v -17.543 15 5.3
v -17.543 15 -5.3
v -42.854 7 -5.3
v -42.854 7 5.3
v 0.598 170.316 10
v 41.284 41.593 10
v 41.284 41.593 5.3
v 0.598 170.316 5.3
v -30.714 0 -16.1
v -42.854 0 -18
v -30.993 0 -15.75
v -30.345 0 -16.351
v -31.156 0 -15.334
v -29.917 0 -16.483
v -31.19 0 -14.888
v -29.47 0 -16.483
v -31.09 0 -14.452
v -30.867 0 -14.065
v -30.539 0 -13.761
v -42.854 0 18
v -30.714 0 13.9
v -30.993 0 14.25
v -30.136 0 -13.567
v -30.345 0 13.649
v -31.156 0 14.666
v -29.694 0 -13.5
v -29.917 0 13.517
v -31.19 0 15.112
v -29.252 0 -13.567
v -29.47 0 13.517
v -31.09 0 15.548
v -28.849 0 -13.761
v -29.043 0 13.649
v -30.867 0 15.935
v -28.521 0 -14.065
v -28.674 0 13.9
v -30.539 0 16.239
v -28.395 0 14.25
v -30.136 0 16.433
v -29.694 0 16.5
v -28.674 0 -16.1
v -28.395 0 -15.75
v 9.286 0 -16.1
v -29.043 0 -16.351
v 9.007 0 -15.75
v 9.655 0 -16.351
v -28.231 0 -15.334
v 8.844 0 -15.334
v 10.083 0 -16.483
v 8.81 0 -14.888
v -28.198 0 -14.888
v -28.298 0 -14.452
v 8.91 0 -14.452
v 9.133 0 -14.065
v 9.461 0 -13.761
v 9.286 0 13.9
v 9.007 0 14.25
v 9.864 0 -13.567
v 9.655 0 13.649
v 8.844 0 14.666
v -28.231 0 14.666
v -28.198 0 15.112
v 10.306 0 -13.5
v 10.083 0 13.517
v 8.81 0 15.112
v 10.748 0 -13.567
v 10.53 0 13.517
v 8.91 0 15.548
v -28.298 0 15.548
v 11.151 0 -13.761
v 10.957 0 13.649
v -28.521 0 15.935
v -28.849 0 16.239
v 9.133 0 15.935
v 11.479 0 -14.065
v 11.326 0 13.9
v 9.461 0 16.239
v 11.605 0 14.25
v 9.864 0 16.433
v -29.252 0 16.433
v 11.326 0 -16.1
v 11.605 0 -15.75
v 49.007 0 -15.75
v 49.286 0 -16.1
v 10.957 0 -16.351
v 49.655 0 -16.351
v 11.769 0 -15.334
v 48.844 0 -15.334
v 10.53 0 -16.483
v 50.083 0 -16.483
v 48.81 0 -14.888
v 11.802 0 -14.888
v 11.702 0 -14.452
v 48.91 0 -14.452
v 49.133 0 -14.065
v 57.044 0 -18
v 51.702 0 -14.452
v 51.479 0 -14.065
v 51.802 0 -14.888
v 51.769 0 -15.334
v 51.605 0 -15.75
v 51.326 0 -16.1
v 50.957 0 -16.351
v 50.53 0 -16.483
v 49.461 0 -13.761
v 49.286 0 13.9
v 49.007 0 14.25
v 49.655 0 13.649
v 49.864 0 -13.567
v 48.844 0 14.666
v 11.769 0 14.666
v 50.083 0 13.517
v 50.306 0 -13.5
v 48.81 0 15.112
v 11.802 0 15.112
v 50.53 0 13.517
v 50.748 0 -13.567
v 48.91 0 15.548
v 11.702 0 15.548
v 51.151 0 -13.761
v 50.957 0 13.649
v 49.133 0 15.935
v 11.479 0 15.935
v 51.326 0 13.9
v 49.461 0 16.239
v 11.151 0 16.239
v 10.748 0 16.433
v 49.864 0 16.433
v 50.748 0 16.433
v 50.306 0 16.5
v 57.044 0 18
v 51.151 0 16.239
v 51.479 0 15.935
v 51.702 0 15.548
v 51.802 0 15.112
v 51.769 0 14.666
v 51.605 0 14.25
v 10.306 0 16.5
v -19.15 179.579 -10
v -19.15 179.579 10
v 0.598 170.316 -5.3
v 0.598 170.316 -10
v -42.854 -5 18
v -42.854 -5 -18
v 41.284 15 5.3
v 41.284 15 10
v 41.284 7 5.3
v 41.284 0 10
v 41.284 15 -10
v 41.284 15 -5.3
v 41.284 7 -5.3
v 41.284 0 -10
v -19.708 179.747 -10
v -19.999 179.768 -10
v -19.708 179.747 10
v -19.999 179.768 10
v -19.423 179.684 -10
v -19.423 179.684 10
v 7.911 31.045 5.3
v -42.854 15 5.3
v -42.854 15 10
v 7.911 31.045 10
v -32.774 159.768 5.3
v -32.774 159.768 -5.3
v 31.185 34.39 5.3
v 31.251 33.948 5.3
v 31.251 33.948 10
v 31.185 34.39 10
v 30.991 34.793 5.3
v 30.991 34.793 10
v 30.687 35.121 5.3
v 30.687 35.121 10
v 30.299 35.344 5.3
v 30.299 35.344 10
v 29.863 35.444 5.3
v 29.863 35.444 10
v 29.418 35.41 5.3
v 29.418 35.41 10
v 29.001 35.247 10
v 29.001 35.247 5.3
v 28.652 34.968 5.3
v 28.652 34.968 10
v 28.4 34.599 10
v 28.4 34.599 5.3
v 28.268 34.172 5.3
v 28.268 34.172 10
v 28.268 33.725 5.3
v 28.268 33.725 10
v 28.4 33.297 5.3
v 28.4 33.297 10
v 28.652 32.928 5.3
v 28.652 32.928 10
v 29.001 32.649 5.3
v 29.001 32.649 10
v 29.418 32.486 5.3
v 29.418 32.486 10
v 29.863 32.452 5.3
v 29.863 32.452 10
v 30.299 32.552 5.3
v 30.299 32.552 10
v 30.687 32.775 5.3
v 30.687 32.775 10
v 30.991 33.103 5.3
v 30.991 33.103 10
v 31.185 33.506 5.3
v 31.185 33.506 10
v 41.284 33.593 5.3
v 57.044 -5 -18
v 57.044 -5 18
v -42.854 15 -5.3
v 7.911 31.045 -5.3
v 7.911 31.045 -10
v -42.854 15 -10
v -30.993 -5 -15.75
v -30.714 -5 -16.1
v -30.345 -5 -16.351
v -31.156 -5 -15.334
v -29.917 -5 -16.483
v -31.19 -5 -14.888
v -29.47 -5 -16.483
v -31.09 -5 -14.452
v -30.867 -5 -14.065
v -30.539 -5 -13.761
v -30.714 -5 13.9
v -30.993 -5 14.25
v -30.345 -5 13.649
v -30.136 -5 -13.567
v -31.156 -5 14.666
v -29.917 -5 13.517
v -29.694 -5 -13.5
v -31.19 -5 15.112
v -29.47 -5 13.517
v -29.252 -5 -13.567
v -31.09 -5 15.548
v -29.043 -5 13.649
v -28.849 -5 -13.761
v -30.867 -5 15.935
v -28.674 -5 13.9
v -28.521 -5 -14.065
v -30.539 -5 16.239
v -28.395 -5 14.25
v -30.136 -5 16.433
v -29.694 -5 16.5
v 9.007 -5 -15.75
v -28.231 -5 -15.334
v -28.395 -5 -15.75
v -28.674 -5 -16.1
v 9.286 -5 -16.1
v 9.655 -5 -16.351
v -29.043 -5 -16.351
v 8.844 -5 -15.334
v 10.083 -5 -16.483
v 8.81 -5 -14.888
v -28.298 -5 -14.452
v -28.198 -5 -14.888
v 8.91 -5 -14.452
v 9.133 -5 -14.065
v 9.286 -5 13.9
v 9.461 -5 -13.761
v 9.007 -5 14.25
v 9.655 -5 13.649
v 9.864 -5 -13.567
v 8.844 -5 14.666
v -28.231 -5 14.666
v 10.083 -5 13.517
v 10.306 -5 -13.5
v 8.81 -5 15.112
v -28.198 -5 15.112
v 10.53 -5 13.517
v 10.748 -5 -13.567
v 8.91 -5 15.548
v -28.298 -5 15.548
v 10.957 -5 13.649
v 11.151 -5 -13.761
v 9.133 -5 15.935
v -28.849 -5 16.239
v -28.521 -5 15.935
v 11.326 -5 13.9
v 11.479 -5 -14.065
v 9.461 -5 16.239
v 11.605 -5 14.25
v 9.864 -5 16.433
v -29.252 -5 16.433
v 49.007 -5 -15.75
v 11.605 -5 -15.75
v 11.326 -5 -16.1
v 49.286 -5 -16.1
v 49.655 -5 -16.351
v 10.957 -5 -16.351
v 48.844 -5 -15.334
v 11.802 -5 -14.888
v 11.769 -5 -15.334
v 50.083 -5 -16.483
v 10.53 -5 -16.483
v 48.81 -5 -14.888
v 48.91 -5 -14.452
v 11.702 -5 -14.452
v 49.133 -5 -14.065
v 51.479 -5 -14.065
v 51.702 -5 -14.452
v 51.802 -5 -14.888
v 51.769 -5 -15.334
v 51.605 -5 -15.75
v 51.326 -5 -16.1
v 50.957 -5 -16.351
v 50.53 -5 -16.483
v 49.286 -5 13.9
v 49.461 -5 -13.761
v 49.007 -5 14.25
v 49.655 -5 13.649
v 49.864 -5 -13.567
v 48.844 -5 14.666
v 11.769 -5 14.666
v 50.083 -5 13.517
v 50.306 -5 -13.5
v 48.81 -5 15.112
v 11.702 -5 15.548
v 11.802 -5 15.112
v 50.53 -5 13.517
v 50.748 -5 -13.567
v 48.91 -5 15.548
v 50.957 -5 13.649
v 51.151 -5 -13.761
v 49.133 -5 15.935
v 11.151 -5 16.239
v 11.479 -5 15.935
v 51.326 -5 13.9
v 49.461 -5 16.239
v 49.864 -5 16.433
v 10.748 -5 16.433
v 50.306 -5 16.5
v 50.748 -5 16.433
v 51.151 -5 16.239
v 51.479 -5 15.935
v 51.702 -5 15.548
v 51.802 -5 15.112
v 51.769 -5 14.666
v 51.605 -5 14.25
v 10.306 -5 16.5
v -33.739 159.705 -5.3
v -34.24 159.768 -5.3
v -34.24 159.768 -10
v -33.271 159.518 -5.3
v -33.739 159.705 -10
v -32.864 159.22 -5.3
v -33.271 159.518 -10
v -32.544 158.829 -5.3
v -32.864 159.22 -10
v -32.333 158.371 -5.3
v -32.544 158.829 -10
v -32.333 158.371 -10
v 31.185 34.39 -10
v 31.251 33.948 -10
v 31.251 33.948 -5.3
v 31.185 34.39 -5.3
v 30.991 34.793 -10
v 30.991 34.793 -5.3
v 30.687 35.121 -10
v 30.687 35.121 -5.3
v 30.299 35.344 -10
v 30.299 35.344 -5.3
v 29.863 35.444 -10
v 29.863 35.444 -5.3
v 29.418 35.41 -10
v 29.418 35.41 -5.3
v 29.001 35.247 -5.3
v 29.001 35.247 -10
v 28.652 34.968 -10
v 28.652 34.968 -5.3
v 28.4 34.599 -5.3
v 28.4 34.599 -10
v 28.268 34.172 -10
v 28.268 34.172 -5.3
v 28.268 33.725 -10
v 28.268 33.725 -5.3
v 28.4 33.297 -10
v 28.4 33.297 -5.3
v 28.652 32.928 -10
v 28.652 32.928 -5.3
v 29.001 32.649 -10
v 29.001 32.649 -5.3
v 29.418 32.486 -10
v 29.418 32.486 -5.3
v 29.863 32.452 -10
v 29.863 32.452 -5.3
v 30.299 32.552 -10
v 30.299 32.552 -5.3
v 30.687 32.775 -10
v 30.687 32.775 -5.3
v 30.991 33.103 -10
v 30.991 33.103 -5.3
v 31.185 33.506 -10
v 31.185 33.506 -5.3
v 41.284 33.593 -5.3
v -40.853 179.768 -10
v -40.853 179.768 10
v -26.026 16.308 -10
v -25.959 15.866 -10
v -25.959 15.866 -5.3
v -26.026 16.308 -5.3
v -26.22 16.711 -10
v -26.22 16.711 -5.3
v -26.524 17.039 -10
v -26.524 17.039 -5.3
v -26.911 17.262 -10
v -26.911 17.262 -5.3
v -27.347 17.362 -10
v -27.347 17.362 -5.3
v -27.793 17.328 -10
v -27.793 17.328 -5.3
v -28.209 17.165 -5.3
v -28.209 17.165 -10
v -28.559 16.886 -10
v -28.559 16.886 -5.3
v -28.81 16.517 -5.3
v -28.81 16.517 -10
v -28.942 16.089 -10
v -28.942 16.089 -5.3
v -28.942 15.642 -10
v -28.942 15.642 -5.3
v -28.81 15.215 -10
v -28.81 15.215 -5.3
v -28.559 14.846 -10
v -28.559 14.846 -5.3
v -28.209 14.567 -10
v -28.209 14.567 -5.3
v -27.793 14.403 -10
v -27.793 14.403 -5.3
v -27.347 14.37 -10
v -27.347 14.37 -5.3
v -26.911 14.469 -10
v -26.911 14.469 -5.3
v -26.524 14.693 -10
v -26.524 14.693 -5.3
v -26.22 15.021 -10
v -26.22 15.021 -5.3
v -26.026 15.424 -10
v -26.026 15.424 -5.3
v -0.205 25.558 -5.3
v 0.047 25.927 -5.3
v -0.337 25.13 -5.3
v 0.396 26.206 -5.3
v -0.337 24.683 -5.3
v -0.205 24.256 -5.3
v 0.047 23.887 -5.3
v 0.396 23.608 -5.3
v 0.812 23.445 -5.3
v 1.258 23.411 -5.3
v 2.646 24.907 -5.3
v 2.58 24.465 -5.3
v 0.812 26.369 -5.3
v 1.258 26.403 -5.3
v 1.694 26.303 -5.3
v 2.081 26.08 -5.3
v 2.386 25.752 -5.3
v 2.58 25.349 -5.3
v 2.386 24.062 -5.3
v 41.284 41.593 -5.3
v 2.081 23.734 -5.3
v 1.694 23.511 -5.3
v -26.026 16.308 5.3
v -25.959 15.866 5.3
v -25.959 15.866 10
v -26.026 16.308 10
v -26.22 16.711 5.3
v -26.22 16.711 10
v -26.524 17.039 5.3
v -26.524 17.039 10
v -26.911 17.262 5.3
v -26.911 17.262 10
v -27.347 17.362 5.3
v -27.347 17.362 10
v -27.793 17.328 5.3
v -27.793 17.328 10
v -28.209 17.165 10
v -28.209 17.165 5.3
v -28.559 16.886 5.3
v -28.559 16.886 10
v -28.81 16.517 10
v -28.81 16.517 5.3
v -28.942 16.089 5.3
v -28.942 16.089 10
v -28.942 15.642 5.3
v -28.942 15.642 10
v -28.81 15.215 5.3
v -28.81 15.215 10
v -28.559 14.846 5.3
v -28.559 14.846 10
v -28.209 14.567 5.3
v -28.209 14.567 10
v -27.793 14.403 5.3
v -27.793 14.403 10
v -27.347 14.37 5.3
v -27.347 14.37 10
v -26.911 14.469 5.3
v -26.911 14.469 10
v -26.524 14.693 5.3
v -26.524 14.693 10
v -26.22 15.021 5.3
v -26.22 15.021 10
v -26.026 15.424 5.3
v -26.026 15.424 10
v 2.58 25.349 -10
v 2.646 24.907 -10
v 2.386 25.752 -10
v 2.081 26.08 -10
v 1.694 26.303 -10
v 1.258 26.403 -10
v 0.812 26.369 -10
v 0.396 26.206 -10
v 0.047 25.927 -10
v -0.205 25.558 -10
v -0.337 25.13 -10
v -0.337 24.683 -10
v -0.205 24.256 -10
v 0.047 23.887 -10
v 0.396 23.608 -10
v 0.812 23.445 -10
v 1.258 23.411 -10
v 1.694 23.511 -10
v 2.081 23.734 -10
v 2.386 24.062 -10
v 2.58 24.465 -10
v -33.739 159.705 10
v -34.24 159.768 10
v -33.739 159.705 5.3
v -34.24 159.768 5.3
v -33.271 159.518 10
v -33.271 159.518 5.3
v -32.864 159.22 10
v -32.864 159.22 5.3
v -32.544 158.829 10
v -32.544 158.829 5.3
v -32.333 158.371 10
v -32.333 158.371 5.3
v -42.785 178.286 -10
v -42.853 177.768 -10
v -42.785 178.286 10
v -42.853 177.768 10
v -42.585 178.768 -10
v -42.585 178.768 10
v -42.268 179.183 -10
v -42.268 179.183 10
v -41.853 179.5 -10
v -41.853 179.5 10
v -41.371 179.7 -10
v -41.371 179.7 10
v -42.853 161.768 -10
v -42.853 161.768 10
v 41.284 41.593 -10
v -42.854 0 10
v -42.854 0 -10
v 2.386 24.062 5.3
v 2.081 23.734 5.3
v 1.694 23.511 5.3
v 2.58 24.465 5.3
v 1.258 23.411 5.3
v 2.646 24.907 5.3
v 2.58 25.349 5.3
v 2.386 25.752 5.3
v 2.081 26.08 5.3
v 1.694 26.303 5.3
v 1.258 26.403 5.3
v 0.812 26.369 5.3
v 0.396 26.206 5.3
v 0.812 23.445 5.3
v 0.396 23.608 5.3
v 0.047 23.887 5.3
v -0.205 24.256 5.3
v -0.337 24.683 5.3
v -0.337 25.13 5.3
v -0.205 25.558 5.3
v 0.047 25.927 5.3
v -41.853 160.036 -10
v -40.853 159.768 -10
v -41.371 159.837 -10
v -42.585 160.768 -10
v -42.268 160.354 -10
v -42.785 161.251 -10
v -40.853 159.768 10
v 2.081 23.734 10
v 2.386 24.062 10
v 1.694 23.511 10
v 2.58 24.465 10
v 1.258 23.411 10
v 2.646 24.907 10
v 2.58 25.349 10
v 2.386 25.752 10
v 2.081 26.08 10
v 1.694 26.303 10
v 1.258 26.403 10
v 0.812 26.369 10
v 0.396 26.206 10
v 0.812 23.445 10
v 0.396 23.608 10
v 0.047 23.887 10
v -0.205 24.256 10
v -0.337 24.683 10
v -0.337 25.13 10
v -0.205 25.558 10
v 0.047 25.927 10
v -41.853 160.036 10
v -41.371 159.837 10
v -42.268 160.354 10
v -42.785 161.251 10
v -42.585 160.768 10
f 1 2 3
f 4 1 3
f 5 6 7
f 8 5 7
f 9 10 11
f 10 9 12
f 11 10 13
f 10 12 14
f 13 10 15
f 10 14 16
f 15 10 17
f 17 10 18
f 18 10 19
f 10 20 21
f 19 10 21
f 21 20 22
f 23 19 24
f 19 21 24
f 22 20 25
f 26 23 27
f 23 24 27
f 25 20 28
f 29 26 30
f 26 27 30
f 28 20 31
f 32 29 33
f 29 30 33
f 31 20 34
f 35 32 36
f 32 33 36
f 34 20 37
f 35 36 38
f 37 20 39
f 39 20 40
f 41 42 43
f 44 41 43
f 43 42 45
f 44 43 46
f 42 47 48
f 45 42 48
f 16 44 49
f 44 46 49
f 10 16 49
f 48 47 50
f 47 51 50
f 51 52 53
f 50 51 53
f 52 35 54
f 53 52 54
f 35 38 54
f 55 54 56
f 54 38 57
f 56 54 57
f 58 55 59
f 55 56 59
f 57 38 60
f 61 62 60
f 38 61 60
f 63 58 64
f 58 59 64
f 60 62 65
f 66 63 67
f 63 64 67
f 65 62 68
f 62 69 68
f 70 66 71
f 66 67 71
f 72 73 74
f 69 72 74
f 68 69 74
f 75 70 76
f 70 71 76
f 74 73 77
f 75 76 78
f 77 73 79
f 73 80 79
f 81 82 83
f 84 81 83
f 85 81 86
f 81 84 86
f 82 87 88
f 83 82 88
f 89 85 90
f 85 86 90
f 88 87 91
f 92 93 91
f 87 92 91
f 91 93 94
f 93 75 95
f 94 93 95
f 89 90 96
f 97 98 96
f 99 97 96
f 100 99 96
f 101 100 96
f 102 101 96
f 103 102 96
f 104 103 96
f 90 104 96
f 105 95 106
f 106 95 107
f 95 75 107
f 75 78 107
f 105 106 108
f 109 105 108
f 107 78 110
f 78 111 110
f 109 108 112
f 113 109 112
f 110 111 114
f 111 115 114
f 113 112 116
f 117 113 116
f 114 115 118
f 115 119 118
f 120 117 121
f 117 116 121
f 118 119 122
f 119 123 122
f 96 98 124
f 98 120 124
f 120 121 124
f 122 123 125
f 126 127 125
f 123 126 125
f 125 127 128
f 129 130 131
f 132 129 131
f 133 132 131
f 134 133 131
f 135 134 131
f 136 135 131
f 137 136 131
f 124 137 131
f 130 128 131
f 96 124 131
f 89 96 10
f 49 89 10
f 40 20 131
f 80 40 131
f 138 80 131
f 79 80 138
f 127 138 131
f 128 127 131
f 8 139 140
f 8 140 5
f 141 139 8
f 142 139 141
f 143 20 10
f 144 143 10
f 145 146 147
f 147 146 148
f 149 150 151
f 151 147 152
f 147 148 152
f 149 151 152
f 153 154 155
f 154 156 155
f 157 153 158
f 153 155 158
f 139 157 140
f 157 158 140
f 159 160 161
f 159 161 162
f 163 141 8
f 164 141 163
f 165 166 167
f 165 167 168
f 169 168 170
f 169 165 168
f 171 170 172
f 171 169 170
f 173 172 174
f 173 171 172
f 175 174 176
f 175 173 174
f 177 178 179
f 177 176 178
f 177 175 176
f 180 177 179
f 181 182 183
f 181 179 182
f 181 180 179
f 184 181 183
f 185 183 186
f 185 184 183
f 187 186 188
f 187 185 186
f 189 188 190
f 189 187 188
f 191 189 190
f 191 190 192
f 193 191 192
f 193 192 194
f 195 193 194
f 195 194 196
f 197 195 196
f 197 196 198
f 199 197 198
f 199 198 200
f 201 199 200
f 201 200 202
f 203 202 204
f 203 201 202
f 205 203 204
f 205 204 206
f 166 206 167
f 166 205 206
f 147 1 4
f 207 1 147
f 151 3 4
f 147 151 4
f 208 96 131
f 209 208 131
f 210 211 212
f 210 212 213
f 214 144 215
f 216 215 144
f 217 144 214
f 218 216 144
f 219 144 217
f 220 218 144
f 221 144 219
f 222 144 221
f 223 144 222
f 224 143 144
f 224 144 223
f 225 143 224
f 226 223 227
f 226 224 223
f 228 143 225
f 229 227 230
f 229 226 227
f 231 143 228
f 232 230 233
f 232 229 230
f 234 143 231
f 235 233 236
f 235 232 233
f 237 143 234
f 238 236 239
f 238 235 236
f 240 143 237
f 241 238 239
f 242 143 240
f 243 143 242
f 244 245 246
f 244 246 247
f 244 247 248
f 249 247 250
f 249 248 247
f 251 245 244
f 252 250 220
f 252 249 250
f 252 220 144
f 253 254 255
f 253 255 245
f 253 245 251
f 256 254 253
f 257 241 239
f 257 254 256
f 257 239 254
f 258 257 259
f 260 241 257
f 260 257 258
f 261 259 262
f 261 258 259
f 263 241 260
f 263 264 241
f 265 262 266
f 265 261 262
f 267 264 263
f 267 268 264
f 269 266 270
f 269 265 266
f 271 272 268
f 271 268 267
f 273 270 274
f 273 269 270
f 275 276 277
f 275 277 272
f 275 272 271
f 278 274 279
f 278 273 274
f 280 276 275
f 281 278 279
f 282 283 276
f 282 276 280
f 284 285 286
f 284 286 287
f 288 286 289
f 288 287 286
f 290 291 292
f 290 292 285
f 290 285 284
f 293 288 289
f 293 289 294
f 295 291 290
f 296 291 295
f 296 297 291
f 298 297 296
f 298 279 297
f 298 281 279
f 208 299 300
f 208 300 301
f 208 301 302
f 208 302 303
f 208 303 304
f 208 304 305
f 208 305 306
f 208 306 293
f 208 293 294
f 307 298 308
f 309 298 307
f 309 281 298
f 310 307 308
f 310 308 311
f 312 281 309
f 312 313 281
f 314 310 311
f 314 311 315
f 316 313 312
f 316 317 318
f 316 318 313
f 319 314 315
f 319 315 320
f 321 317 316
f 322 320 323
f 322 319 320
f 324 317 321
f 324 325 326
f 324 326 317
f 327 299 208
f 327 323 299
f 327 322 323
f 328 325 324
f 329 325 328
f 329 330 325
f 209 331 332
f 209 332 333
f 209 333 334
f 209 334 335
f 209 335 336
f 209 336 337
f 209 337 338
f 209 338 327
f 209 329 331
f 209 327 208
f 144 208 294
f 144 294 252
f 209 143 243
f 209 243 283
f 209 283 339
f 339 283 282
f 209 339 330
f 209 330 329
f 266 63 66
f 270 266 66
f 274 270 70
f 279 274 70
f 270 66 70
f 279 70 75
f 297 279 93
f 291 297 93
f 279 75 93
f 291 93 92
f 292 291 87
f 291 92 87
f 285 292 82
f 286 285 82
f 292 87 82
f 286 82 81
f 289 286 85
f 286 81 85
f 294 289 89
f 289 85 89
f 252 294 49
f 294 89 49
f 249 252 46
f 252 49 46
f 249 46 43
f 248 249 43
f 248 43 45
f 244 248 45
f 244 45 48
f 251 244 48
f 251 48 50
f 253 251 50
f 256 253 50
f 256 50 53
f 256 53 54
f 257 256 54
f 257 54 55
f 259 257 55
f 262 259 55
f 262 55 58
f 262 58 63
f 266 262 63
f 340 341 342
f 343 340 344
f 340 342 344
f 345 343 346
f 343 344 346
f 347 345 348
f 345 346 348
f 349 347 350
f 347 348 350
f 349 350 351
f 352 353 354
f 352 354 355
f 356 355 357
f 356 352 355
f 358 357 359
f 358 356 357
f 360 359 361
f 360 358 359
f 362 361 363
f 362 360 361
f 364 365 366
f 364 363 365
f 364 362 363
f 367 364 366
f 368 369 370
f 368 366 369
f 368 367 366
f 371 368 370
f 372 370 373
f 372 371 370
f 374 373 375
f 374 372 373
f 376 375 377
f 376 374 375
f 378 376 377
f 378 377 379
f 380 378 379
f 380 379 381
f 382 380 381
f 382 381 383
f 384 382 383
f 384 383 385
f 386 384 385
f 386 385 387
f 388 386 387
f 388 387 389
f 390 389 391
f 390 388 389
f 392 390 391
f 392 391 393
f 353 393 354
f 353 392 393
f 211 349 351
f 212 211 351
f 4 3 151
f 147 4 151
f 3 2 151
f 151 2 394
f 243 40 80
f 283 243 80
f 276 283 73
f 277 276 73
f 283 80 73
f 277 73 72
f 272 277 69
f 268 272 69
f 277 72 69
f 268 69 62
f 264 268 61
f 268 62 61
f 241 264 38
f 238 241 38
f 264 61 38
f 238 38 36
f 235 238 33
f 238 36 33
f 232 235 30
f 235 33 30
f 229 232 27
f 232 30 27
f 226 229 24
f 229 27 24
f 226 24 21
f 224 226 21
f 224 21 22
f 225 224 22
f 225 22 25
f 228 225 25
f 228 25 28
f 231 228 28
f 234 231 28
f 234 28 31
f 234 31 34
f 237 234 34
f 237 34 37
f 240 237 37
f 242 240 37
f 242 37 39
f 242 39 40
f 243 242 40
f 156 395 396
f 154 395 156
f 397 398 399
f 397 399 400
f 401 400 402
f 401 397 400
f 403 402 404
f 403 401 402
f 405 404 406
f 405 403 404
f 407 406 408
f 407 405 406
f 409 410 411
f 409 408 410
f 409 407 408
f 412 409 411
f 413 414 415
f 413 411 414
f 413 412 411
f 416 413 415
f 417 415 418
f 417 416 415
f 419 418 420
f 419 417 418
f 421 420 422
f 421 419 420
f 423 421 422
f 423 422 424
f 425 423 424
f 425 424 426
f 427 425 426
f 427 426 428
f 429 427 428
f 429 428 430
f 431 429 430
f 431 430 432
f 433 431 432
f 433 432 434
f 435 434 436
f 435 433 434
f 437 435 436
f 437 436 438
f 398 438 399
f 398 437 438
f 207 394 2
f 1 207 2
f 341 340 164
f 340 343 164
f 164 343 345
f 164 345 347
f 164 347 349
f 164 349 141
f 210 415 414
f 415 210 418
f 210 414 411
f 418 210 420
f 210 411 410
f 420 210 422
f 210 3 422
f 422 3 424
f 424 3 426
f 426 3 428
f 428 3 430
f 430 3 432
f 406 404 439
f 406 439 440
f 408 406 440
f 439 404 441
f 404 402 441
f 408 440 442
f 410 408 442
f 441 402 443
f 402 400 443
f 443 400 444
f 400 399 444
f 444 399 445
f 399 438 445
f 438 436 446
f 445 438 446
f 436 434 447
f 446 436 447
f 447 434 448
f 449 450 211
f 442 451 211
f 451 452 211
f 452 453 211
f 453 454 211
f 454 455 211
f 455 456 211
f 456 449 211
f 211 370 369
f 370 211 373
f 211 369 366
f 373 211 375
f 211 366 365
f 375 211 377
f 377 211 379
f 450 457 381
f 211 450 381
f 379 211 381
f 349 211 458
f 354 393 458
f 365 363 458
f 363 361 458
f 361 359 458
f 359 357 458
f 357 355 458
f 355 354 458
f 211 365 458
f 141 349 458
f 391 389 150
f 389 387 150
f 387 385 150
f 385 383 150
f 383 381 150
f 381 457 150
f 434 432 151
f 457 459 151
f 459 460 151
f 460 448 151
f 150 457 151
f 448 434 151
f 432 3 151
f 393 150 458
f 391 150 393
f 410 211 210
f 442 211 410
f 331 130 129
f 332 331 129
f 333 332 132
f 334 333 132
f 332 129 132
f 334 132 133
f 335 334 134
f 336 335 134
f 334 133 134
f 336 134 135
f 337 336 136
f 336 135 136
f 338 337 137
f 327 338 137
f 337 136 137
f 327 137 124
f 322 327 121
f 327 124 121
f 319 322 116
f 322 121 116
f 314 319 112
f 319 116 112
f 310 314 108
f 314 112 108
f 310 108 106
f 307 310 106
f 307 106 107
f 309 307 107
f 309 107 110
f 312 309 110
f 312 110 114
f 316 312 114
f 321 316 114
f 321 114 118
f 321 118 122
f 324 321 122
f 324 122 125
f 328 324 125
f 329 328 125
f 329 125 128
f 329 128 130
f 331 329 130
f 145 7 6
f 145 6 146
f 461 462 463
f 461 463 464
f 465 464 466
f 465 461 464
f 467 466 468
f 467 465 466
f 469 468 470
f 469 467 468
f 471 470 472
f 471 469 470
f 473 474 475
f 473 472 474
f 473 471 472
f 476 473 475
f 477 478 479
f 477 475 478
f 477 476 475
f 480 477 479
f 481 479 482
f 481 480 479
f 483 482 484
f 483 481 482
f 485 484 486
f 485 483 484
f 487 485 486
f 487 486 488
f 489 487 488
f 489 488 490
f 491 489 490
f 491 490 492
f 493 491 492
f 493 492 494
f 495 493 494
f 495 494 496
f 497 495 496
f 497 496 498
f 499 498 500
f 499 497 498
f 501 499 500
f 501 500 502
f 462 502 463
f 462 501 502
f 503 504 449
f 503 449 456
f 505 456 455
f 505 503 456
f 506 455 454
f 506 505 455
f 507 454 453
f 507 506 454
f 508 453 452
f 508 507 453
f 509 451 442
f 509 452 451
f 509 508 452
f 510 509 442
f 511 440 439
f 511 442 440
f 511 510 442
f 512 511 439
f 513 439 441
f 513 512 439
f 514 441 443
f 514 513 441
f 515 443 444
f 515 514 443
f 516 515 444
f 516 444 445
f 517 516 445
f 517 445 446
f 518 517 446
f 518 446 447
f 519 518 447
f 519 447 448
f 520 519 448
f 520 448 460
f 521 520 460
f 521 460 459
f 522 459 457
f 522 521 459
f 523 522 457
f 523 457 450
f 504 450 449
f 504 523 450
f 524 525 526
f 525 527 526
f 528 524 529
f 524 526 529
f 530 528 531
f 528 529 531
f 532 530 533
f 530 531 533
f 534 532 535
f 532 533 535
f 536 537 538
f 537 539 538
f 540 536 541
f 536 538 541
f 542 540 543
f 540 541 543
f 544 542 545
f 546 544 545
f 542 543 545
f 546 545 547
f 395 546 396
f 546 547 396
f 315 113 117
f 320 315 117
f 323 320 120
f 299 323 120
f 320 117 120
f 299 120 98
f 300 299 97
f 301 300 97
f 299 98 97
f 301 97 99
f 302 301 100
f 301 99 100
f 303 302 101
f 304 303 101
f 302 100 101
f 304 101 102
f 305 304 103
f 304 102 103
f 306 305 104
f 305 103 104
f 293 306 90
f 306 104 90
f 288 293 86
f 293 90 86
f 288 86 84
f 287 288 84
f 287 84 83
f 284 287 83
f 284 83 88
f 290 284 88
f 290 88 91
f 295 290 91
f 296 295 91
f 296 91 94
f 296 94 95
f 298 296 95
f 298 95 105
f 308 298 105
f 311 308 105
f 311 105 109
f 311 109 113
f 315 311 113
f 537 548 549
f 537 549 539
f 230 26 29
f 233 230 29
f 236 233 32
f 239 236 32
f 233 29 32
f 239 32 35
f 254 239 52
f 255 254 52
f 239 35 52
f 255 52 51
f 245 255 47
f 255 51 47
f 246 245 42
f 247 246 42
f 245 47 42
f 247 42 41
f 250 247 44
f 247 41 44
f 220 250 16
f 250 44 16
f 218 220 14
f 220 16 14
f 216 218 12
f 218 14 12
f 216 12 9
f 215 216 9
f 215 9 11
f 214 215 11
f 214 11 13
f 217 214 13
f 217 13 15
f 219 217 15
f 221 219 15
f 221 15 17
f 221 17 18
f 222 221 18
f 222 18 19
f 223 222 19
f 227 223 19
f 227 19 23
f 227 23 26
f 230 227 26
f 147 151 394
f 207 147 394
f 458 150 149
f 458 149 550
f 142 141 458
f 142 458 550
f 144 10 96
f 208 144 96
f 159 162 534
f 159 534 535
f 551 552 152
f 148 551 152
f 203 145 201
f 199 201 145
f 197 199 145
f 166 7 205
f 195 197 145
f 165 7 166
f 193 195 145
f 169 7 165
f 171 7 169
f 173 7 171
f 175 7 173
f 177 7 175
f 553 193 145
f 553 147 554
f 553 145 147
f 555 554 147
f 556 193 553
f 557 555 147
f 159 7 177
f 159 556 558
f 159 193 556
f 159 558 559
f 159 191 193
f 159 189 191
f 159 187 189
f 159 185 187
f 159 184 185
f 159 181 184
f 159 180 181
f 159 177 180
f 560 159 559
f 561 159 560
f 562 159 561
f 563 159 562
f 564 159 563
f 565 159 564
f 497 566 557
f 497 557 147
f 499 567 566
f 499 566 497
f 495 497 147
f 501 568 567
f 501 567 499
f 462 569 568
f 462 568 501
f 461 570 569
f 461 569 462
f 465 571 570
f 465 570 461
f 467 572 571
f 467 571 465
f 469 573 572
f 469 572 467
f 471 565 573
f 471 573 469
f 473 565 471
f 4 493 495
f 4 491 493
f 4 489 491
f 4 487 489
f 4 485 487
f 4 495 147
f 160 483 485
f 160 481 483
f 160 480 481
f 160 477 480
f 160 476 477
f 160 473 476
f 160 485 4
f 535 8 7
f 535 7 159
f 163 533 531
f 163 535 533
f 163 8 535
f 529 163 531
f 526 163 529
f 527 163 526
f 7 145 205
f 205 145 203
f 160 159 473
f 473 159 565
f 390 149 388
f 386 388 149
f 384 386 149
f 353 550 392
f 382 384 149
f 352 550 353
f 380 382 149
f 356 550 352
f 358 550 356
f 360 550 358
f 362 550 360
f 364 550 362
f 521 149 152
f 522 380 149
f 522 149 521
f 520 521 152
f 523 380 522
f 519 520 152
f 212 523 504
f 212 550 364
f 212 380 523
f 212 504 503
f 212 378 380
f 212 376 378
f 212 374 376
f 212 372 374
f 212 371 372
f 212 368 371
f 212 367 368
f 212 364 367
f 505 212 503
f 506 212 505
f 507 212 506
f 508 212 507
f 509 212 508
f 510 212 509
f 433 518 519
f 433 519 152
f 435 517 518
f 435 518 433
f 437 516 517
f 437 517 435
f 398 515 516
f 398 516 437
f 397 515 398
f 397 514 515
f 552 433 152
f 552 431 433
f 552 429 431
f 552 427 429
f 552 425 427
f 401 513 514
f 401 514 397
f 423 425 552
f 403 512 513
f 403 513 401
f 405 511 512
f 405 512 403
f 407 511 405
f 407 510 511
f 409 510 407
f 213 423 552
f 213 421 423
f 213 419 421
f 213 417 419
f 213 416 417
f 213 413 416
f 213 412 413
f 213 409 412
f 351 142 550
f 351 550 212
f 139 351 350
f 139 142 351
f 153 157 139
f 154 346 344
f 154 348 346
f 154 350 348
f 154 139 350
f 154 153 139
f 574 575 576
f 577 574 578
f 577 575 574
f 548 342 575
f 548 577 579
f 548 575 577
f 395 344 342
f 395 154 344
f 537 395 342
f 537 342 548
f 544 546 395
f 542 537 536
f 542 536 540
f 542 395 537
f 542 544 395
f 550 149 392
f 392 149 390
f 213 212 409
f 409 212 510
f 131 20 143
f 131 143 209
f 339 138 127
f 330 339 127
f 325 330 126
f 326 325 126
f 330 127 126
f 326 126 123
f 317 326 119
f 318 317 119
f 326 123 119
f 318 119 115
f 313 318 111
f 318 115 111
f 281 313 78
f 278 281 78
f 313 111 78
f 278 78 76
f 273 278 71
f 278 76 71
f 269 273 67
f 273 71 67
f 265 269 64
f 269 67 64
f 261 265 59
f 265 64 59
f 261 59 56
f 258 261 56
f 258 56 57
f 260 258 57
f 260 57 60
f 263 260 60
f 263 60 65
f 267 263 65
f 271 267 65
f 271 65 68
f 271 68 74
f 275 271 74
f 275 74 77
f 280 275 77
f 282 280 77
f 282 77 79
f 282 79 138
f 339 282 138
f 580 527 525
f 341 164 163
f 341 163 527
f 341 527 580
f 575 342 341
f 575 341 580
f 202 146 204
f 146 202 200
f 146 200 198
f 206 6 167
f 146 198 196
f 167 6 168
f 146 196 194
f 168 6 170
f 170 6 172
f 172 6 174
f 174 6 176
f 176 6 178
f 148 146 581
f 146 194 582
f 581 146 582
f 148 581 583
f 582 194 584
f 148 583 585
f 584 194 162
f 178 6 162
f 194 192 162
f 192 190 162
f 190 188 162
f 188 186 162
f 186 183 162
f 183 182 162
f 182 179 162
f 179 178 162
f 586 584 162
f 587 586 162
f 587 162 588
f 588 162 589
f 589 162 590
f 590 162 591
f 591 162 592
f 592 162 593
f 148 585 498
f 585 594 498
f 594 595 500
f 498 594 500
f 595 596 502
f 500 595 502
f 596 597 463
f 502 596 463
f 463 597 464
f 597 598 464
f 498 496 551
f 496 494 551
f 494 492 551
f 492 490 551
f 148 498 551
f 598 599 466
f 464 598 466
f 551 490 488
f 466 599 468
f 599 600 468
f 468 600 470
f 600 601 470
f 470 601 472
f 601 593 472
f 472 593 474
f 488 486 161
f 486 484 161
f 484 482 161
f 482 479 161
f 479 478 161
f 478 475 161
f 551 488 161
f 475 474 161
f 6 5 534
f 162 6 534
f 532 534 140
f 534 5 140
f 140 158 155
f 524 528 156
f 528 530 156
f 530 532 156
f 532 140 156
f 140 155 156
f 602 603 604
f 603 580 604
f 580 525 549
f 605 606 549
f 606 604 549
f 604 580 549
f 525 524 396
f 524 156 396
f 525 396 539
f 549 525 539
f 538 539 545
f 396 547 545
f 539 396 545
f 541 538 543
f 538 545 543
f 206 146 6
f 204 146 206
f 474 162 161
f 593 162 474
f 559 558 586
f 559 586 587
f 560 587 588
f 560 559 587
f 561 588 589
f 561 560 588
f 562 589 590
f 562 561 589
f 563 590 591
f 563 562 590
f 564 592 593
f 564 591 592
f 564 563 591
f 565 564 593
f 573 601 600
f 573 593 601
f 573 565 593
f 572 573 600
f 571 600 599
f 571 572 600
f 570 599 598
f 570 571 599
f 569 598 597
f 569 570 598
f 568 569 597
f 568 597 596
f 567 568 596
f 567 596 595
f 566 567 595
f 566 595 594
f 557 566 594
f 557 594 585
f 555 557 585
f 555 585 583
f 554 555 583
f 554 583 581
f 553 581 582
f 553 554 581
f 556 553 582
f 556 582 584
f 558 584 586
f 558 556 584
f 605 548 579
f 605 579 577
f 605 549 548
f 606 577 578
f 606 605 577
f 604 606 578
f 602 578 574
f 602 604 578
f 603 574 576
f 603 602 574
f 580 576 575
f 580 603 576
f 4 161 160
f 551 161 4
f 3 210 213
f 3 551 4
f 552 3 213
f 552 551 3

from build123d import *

# Parameters (mm, degrees)
SKETCH1_W               = 84.13774666
SKETCH1_H               = 20
BOSS_EXTRUDE1_DEPTH     = 15
SKETCH5_W               = 10.6
SKETCH5_H               = 8
CUT_EXTRUDE1_DEPTH      = 85.71
SKETCH8_W               = 109.89774666
SKETCH8_H               = 36
SKETCH8_W_2             = 84.13774666
SKETCH8_H_2             = 20
BOSS_EXTRUDE4_DEPTH     = 5
SKETCH9_R               = 1.5
SKETCH9_W               = 10
SKETCH9_H               = 18
CUT_EXTRUDE3_DEPTH      = 62.668496692
BOSS_EXTRUDE7_DEPTH     = 10.6
BOSS_EXTRUDE8_DEPTH     = 4.7
BOSS_EXTRUDE9_DEPTH     = 4.7
CUT_EXTRUDE4_DEPTH      = 75.342943395
CUT_EXTRUDE4_DEPTH_BACK = 75.342943395
SKETCH15_R              = 1.5
SKETCH28_W              = 35
SKETCH28_H              = 4.7
BOSS_EXTRUDE11_DEPTH    = 135
BOSS_EXTRUDE15_DEPTH    = 20
FILLET2_R               = 2


with BuildPart() as part:
    # Sketch1 → Boss-Extrude1 (new body)
    with BuildSketch(Plane(origin=(0, 0, 0), x_dir=(1, 0, 0), z_dir=(0, 1, 0))):
        with Locations((-0.785000002, 0)):
            Rectangle(SKETCH1_W, SKETCH1_H)
    extrude(amount=BOSS_EXTRUDE1_DEPTH)

    # Sketch5 → Cut-Extrude1 (cut)
    with BuildSketch(Plane.ZY.offset(42.853873332)):
        with Locations((0, 11)):
            Rectangle(SKETCH5_W, SKETCH5_H)
    extrude(amount=-CUT_EXTRUDE1_DEPTH, mode=Mode.SUBTRACT)

    # Sketch13 → Boss-Extrude8 (add)
    with BuildSketch(Plane.XY.offset(-5.3)):
        Polygon((41.283565473, 41.593025237), (-42.853873332, 15), (-17.542743649, 15), (41.283565473, 33.593025237), align=None)
        Polygon((41.283565473, 33.593025237), (-17.542743649, 15), (41.283565473, 15), align=None)
    extrude(amount=-BOSS_EXTRUDE8_DEPTH)

    # Sketch14 → Boss-Extrude9 (add)
    with BuildSketch(Plane(origin=(0, 0, 5.3), x_dir=(-1, 0, 0), z_dir=(0, 0, -1))):
        Polygon((42.853873332, 15), (-41.283565473, 41.593025237), (-41.283565473, 15), align=None)
    extrude(amount=-BOSS_EXTRUDE9_DEPTH)

    # Sketch15 → Cut-Extrude4 (cut, two sides: drawn at the far end of the back side and taken through both)
    with BuildSketch(Plane.XY.offset(-5.3).offset(-CUT_EXTRUDE4_DEPTH_BACK)):
        with Locations((-27.45904269, 15.865790136)):
            Circle(SKETCH15_R)
        with Locations((1.146160893, 24.906936522)):
            Circle(SKETCH15_R)
        with Locations((29.751364476, 33.948082908)):
            Circle(SKETCH15_R)
    extrude(amount=CUT_EXTRUDE4_DEPTH + CUT_EXTRUDE4_DEPTH_BACK, mode=Mode.SUBTRACT)

    # Sketch28 → Boss-Extrude11 (add)
    with BuildSketch(Plane(origin=(-8.202592071, 25.952108956, 0), x_dir=(0.9535067860990042, 0.3013715462069171, 0), z_dir=(-0.3013715462069171, 0.9535067860990042, 0))):
        with Locations((34.39911416, 7.65)):
            Rectangle(SKETCH28_W, SKETCH28_H)
        with Locations((34.39911416, -7.65)):
            Rectangle(SKETCH28_W, SKETCH28_H)
    extrude(amount=BOSS_EXTRUDE11_DEPTH)

    # Sketch31 → Boss-Extrude15 (add)
    with BuildSketch(Plane(origin=(0, 0, -10), x_dir=(-1, 0, 0), z_dir=(0, 0, -1))):
        Polygon((42.853369775, 159.768437243), (42.853369775, 179.768437243), (19.553369775, 179.768437243), (-0.598406735, 170.316441361), (32.774330778, 159.768437243), align=None)
    extrude(amount=-BOSS_EXTRUDE15_DEPTH)

    # Fillet2
    fillet2_edges = [part.edges().sort_by_distance(p)[0] for p in [
        (-32.774330778, 159.768437243, 7.65),
        (-19.553369775, 179.768437243, 0),
        (-42.853369775, 179.768437243, 0),
        (-42.853369775, 159.768437243, 0),
        (-32.774330778, 159.768437243, -7.65),
    ]]
    fillet(fillet2_edges, radius=FILLET2_R)


with BuildPart() as body_2:
    # Sketch8 → Boss-Extrude4 (new body)
    # profile 1 of 2: a face of its own
    with BuildSketch(Plane.XZ):
        with Locations((2.094999998, 0)):
            Rectangle(SKETCH8_W, SKETCH8_H)
        with Locations((-0.785000002, 0)):
            Rectangle(SKETCH8_W_2, SKETCH8_H_2, mode=Mode.SUBTRACT)
    # profile 2 of 2: a face of its own
    with BuildSketch(Plane.XZ):
        with Locations((-0.785000002, 0)):
            Rectangle(SKETCH8_W_2, SKETCH8_H_2)
    extrude(amount=BOSS_EXTRUDE4_DEPTH)

    # Sketch9 → Cut-Extrude3 (cut, through all)
    with BuildSketch(Plane(origin=(0, 0, 0), x_dir=(1, 0, 0), z_dir=(0, 1, 0))):
        with Locations(Location((-29.693873332, 15, 0), (0, 0, 270))):
            Circle(SKETCH9_R)
        with Locations(Location((10.306126668, 15, 0), (0, 0, 270))):
            Circle(SKETCH9_R)
        with Locations(Location((-29.693873332, -15, 0), (0, 0, 270))):
            Circle(SKETCH9_R)
        with Locations(Location((50.306126668, -15, 0), (0, 0, 270))):
            Circle(SKETCH9_R)
        with Locations(Location((50.306126668, 15, 0), (0, 0, 270))):
            Circle(SKETCH9_R)
        with Locations((-47.853873332, 9)):
            Rectangle(SKETCH9_W, SKETCH9_H)
        with Locations((-47.853873332, -9)):
            Rectangle(SKETCH9_W, SKETCH9_H)
        with Locations(Location((10.306126668, -15, 0), (0, 0, 270))):
            Circle(SKETCH9_R)
    extrude(amount=-CUT_EXTRUDE3_DEPTH, mode=Mode.SUBTRACT)


with BuildPart() as body_3:
    # Sketch11 → Boss-Extrude7 (new body)
    with BuildSketch(Plane.XY.offset(-5.3)):
        Polygon((41.283565473, 33.593025237), (-17.542743649, 15), (41.283565473, 15), align=None)
        Polygon((-17.542743649, 15), (-42.853873332, 7), (41.283565473, 7), (41.283565473, 15), align=None)
    extrude(amount=BOSS_EXTRUDE7_DEPTH)


solid = Compound([part.part, body_2.part, body_3.part])
